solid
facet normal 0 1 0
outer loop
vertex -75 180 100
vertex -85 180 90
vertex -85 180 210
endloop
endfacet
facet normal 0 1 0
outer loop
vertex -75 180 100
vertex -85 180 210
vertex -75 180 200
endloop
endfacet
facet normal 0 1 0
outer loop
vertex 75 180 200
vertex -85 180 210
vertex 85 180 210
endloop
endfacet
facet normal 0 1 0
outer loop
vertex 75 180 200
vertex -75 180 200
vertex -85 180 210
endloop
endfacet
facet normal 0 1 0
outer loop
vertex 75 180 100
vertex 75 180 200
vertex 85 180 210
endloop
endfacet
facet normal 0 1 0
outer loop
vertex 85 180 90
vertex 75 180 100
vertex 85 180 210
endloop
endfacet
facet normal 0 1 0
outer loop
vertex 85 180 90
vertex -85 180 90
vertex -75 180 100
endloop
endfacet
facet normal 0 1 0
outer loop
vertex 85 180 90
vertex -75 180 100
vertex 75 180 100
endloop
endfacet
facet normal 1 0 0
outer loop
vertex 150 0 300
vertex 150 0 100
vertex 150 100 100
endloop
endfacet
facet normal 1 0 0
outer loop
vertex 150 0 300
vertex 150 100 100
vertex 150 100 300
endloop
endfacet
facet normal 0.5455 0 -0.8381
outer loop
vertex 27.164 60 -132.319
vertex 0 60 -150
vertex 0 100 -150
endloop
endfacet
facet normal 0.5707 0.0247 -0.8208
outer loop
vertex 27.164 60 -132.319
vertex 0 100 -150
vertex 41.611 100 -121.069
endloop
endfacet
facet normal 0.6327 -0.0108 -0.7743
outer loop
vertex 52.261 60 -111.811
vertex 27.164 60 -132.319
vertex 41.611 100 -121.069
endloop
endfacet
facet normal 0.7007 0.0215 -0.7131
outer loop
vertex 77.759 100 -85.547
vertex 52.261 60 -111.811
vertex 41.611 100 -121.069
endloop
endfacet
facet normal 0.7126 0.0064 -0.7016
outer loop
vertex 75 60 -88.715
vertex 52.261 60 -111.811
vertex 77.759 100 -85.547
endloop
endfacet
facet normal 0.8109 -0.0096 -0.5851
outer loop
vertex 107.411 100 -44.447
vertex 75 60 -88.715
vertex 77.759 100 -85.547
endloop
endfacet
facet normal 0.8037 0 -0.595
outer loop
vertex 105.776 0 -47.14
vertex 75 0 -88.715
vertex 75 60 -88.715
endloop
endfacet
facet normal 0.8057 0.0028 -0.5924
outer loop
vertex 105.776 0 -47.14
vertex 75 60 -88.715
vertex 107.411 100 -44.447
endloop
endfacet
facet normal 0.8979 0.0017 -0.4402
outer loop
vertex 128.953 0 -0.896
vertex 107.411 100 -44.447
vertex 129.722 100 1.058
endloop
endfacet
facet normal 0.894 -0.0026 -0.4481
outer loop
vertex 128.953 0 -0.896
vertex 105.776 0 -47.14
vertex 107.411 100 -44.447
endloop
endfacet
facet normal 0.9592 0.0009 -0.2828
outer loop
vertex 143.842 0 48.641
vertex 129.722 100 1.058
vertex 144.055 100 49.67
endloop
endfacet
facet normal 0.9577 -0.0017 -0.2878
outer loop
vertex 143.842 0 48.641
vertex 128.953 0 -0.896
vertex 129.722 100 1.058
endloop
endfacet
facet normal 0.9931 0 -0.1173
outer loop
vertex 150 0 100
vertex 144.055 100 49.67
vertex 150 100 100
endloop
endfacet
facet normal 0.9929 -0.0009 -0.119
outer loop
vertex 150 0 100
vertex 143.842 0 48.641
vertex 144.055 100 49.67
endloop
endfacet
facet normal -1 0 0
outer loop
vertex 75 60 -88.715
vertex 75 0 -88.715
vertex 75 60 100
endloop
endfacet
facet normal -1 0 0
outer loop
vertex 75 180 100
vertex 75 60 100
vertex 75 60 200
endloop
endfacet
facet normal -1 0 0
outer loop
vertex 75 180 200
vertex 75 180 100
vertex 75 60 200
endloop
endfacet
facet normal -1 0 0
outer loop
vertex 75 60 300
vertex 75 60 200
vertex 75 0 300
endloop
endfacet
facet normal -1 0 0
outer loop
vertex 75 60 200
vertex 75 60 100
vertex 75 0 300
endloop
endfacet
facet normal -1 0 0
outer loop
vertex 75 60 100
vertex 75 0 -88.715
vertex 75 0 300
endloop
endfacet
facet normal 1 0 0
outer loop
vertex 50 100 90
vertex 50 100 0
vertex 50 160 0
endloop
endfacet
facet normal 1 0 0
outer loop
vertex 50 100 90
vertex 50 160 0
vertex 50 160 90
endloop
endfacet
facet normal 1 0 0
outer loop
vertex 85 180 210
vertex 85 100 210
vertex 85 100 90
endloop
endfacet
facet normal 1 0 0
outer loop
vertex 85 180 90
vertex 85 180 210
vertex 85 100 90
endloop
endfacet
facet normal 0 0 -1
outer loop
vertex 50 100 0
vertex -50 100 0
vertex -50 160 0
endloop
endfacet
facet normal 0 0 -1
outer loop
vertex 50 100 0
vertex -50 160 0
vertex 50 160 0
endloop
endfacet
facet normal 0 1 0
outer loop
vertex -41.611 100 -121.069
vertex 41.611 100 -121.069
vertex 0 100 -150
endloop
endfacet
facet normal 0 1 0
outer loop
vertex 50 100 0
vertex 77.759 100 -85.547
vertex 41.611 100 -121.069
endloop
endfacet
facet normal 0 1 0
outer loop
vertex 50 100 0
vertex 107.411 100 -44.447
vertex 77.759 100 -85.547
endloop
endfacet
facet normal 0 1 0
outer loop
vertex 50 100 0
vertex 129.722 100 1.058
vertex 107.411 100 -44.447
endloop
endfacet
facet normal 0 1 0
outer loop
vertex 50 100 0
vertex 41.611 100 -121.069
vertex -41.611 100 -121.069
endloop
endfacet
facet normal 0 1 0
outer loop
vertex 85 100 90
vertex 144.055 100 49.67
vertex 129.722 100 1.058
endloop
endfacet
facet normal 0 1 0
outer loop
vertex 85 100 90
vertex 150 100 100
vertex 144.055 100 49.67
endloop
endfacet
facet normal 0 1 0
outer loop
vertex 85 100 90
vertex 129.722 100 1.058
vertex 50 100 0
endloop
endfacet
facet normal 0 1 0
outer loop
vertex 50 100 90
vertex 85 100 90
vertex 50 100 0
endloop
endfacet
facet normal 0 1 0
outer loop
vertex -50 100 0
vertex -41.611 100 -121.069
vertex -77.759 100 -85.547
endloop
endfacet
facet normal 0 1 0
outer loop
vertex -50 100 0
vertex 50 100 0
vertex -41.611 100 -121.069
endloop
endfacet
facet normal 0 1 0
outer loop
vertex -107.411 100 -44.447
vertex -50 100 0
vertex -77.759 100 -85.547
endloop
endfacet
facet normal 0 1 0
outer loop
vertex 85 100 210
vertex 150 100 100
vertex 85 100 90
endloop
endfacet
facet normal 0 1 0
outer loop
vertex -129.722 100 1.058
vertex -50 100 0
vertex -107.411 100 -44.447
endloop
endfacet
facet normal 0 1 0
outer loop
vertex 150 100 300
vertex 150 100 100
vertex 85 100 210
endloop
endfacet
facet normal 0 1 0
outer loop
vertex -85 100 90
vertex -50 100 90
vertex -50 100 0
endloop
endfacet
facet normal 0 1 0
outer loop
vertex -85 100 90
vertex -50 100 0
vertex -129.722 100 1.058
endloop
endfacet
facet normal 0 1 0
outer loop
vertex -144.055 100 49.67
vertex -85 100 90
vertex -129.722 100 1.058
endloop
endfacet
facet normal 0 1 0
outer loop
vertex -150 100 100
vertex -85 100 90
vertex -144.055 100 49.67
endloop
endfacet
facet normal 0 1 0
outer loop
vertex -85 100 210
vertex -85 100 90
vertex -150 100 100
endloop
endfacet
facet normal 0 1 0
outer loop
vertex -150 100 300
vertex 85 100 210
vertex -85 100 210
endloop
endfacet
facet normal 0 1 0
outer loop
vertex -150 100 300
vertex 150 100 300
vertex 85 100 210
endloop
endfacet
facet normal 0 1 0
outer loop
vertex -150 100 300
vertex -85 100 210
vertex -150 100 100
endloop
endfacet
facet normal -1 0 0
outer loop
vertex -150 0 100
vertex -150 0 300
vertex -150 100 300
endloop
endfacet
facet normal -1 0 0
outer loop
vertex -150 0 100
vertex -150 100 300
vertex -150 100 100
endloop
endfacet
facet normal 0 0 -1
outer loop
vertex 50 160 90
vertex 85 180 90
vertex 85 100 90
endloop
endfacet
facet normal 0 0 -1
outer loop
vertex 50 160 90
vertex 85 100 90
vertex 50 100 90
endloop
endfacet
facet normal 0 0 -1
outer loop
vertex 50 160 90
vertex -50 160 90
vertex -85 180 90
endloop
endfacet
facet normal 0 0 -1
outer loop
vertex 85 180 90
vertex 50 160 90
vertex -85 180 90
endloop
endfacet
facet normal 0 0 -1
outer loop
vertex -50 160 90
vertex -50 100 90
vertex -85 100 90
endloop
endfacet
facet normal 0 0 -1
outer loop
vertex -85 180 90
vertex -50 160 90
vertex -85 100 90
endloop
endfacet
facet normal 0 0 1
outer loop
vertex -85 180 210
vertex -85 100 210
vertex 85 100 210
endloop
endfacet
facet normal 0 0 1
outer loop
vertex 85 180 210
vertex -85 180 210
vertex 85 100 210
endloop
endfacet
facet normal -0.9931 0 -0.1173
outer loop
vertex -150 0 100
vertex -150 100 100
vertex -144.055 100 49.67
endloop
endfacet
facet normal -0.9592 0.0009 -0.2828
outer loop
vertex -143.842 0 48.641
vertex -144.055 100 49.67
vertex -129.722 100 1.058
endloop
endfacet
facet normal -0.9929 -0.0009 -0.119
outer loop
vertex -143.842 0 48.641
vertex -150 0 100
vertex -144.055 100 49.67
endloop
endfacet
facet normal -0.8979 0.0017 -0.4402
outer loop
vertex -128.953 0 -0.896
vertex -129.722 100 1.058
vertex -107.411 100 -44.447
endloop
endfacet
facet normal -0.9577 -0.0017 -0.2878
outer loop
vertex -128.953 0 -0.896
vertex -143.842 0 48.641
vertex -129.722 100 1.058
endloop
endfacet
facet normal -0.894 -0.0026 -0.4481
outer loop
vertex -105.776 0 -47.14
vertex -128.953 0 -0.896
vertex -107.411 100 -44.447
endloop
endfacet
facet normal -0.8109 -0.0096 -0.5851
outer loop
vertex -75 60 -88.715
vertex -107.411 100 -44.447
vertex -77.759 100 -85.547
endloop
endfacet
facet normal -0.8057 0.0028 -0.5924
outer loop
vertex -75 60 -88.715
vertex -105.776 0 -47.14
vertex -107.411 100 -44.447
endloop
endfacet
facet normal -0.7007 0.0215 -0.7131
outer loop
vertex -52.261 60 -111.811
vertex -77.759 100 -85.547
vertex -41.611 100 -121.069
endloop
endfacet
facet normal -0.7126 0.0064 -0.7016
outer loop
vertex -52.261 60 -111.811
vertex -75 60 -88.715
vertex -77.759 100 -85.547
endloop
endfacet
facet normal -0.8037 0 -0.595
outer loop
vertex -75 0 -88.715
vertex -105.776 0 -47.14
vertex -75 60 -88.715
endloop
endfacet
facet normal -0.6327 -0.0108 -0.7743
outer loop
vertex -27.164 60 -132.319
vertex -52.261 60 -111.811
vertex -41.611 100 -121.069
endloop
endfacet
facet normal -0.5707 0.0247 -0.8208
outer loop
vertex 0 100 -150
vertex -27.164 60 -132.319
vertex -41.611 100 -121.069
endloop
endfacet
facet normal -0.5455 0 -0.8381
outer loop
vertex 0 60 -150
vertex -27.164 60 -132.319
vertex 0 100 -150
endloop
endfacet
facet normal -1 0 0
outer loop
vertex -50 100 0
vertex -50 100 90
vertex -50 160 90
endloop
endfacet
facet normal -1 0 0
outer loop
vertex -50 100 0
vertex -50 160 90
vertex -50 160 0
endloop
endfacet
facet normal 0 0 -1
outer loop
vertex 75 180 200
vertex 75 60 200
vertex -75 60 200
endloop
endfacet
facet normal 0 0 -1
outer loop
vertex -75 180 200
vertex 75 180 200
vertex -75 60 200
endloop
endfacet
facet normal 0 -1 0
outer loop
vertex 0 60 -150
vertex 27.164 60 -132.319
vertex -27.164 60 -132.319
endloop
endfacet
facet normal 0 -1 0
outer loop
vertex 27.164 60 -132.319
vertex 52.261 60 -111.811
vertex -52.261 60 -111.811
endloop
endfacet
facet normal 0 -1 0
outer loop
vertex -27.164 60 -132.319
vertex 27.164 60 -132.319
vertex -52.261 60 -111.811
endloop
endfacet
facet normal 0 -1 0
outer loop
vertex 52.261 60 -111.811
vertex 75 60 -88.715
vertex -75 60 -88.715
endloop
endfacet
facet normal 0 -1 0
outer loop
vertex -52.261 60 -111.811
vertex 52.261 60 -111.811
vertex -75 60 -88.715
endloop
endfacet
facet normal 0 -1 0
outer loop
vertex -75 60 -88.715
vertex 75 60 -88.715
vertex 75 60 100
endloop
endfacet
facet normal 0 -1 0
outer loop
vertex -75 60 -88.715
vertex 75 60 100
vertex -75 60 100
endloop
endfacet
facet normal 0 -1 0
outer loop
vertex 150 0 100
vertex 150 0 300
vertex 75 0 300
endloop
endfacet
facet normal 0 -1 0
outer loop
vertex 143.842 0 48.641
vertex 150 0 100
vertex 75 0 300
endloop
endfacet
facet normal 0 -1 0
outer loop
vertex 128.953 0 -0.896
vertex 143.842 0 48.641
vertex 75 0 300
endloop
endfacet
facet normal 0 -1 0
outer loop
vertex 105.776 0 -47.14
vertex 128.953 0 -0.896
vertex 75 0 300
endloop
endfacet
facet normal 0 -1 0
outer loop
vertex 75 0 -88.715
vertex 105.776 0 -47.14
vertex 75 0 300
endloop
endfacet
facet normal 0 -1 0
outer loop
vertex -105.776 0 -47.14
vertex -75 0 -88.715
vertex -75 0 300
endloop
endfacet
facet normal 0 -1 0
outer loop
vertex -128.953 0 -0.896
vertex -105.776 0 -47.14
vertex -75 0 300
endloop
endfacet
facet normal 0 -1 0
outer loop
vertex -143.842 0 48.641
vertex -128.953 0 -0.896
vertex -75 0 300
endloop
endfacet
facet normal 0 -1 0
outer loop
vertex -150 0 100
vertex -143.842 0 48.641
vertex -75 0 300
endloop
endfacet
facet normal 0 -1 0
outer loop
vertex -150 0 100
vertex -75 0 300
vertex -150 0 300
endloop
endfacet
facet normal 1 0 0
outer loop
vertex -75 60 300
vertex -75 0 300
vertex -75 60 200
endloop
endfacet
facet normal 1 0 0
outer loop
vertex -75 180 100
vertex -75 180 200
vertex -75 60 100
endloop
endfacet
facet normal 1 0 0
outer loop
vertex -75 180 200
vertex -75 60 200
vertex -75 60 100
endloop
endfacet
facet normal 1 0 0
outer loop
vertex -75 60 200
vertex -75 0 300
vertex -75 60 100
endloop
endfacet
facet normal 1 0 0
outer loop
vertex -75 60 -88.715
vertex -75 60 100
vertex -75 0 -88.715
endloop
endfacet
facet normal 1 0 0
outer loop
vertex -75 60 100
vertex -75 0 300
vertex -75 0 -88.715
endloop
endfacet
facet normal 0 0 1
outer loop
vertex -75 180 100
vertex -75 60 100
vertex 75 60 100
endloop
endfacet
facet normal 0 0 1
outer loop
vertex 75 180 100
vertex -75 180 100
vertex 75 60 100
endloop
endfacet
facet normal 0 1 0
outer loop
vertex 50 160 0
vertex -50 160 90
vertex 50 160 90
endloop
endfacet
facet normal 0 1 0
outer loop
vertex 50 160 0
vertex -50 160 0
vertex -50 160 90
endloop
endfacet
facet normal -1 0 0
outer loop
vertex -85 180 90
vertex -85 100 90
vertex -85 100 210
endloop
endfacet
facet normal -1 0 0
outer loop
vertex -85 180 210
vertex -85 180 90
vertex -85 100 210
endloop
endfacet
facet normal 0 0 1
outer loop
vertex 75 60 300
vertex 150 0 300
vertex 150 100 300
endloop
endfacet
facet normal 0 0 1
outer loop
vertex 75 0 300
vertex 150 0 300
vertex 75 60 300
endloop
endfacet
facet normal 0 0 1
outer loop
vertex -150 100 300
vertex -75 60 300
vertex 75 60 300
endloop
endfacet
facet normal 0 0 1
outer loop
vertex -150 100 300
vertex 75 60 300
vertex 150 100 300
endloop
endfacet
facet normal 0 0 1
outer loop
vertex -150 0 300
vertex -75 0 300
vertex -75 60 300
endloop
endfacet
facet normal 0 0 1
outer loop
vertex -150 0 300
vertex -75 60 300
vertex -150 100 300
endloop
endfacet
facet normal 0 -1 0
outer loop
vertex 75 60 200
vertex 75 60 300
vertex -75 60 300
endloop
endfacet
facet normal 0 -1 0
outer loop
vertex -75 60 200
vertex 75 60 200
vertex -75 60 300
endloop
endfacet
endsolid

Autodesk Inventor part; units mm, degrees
ref_plane "YZ Plane" through (0, 0, 0) normal (1, 0, 0) x (0, 1, 0)
ref_plane "XZ Plane" through (0, 0, 0) normal (0, 1, 0) x (-1, 0, 0)
ref_plane "XY Plane" through (0, 0, 0) normal (0, 0, 1) x (1, 0, 0)
sketch "Sketch3" plane through (0, 0, 0) normal (0, 1, 0) x (-1, 0, 0)
  line L0 (150, 0) -> (-150, 0)
  line L1 (-150, 0) -> (-150, 300)
  line L2 (-150, 300) -> (150, 300)
  line L3 (150, 300) -> (150, 0)
  circle A0 centre (0, 0) radius 150
  arc A1 (0, -150) -> (150, 100) centre (-149.8365, 109.9019) ccw
  arc A2 (-150, 100) -> (0, -150) centre (149.8365, 109.9019) ccw
  dimension "d6" = 300
  dimension "d7" = 300
  dimension "d8" = 100
  dimension "d9" = 100
  dimension "d10" = 300
  dimension "d11" = 300
extrude "Extrusion2" add sketch "Sketch3" along normal blind 100 contours A1 A2 L0 | L0 A2 A0 A1 | A1 A0 A2 L1 L2 L3
sketch "Sketch4" plane through (-150, 0, 300) normal (0, 0, 1) x (1, 0, 0)
  line L0 (75, 0) -> (225, 0)
  line L1 (225, 0) -> (225, 60)
  line L2 (225, 60) -> (75, 60)
  line L3 (75, 60) -> (75, 0)
  line L4 (0, 0) -> (300, 0) projected
  point P0 (150, 0)
  point P1 (150, 0)
  dimension "d14" = 60
  dimension "d15" = 150
extrude "Extrusion3" cut sketch "Sketch4" against normal through all
sketch "Sketch5" plane through (-75, 60, 300) normal (0, -1, 0) x (1, 0, 0)
  line L0 (0, -388.7146) -> (0, 0) projected
  line L1 (150, 0) -> (150, -388.7146) projected
  line L2 (0, -100) -> (150, -100)
  line L3 (150, -100) -> (150, -200)
  line L4 (150, -200) -> (0, -200)
  line L5 (0, -200) -> (0, -100)
  point P0 (75, -300)
  dimension "d18" = 100
  dimension "d19" = 100
extrude "Extrusion4" cut sketch "Sketch5" against normal through all
sketch "Sketch6" plane through (0, 100, 0) normal (0, 1, 0) x (1, 0, 0)
  line L0 (-75, -200) -> (-75, -100) projected
  line L1 (-75, -100) -> (75, -100) projected
  line L2 (75, -100) -> (75, -200) projected
  line L3 (75, -200) -> (-75, -200) projected
  line L4 (-150, -100) -> (-150, -300) projected
  line L5 (-150, -300) -> (150, -300) projected
  line L6 (150, -300) -> (150, -100) projected
  arc A0 (150, -100) -> (0, 150) centre (-149.8365, -109.9019) ccw projected
  arc A1 (0, 150) -> (-150, -100) centre (149.8365, -109.9019) ccw projected
  line L7 (85, -90) -> (-85, -90)
  line L8 (-85, -90) -> (-85, -210)
  line L9 (-85, -210) -> (85, -210)
  line L10 (85, -210) -> (85, -90)
  point P0 (0, 0)
  dimension "d22" = 10
extrude "Extrusion5" add sketch "Sketch6" along normal blind 80 contours L10 L9 L8 L7
sketch "Sketch7" plane through (0, 100, 0) normal (0, 1, 0) x (1, 0, 0)
  line L0 (85, -90) -> (-85, -90) construction
  line L1 (50, -90) -> (-50, -90)
  line L2 (-50, -90) -> (-50, 0)
  line L3 (-50, 0) -> (50, 0)
  line L4 (50, 0) -> (50, -90)
  point P0 (0, 0)
  point P1 (0, -90)
  point P2 (0, 0)
  dimension "d25" = 100
extrude "Extrusion6" add sketch "Sketch7" along normal blind 60
properties part number "GeneralCraftShape3"
